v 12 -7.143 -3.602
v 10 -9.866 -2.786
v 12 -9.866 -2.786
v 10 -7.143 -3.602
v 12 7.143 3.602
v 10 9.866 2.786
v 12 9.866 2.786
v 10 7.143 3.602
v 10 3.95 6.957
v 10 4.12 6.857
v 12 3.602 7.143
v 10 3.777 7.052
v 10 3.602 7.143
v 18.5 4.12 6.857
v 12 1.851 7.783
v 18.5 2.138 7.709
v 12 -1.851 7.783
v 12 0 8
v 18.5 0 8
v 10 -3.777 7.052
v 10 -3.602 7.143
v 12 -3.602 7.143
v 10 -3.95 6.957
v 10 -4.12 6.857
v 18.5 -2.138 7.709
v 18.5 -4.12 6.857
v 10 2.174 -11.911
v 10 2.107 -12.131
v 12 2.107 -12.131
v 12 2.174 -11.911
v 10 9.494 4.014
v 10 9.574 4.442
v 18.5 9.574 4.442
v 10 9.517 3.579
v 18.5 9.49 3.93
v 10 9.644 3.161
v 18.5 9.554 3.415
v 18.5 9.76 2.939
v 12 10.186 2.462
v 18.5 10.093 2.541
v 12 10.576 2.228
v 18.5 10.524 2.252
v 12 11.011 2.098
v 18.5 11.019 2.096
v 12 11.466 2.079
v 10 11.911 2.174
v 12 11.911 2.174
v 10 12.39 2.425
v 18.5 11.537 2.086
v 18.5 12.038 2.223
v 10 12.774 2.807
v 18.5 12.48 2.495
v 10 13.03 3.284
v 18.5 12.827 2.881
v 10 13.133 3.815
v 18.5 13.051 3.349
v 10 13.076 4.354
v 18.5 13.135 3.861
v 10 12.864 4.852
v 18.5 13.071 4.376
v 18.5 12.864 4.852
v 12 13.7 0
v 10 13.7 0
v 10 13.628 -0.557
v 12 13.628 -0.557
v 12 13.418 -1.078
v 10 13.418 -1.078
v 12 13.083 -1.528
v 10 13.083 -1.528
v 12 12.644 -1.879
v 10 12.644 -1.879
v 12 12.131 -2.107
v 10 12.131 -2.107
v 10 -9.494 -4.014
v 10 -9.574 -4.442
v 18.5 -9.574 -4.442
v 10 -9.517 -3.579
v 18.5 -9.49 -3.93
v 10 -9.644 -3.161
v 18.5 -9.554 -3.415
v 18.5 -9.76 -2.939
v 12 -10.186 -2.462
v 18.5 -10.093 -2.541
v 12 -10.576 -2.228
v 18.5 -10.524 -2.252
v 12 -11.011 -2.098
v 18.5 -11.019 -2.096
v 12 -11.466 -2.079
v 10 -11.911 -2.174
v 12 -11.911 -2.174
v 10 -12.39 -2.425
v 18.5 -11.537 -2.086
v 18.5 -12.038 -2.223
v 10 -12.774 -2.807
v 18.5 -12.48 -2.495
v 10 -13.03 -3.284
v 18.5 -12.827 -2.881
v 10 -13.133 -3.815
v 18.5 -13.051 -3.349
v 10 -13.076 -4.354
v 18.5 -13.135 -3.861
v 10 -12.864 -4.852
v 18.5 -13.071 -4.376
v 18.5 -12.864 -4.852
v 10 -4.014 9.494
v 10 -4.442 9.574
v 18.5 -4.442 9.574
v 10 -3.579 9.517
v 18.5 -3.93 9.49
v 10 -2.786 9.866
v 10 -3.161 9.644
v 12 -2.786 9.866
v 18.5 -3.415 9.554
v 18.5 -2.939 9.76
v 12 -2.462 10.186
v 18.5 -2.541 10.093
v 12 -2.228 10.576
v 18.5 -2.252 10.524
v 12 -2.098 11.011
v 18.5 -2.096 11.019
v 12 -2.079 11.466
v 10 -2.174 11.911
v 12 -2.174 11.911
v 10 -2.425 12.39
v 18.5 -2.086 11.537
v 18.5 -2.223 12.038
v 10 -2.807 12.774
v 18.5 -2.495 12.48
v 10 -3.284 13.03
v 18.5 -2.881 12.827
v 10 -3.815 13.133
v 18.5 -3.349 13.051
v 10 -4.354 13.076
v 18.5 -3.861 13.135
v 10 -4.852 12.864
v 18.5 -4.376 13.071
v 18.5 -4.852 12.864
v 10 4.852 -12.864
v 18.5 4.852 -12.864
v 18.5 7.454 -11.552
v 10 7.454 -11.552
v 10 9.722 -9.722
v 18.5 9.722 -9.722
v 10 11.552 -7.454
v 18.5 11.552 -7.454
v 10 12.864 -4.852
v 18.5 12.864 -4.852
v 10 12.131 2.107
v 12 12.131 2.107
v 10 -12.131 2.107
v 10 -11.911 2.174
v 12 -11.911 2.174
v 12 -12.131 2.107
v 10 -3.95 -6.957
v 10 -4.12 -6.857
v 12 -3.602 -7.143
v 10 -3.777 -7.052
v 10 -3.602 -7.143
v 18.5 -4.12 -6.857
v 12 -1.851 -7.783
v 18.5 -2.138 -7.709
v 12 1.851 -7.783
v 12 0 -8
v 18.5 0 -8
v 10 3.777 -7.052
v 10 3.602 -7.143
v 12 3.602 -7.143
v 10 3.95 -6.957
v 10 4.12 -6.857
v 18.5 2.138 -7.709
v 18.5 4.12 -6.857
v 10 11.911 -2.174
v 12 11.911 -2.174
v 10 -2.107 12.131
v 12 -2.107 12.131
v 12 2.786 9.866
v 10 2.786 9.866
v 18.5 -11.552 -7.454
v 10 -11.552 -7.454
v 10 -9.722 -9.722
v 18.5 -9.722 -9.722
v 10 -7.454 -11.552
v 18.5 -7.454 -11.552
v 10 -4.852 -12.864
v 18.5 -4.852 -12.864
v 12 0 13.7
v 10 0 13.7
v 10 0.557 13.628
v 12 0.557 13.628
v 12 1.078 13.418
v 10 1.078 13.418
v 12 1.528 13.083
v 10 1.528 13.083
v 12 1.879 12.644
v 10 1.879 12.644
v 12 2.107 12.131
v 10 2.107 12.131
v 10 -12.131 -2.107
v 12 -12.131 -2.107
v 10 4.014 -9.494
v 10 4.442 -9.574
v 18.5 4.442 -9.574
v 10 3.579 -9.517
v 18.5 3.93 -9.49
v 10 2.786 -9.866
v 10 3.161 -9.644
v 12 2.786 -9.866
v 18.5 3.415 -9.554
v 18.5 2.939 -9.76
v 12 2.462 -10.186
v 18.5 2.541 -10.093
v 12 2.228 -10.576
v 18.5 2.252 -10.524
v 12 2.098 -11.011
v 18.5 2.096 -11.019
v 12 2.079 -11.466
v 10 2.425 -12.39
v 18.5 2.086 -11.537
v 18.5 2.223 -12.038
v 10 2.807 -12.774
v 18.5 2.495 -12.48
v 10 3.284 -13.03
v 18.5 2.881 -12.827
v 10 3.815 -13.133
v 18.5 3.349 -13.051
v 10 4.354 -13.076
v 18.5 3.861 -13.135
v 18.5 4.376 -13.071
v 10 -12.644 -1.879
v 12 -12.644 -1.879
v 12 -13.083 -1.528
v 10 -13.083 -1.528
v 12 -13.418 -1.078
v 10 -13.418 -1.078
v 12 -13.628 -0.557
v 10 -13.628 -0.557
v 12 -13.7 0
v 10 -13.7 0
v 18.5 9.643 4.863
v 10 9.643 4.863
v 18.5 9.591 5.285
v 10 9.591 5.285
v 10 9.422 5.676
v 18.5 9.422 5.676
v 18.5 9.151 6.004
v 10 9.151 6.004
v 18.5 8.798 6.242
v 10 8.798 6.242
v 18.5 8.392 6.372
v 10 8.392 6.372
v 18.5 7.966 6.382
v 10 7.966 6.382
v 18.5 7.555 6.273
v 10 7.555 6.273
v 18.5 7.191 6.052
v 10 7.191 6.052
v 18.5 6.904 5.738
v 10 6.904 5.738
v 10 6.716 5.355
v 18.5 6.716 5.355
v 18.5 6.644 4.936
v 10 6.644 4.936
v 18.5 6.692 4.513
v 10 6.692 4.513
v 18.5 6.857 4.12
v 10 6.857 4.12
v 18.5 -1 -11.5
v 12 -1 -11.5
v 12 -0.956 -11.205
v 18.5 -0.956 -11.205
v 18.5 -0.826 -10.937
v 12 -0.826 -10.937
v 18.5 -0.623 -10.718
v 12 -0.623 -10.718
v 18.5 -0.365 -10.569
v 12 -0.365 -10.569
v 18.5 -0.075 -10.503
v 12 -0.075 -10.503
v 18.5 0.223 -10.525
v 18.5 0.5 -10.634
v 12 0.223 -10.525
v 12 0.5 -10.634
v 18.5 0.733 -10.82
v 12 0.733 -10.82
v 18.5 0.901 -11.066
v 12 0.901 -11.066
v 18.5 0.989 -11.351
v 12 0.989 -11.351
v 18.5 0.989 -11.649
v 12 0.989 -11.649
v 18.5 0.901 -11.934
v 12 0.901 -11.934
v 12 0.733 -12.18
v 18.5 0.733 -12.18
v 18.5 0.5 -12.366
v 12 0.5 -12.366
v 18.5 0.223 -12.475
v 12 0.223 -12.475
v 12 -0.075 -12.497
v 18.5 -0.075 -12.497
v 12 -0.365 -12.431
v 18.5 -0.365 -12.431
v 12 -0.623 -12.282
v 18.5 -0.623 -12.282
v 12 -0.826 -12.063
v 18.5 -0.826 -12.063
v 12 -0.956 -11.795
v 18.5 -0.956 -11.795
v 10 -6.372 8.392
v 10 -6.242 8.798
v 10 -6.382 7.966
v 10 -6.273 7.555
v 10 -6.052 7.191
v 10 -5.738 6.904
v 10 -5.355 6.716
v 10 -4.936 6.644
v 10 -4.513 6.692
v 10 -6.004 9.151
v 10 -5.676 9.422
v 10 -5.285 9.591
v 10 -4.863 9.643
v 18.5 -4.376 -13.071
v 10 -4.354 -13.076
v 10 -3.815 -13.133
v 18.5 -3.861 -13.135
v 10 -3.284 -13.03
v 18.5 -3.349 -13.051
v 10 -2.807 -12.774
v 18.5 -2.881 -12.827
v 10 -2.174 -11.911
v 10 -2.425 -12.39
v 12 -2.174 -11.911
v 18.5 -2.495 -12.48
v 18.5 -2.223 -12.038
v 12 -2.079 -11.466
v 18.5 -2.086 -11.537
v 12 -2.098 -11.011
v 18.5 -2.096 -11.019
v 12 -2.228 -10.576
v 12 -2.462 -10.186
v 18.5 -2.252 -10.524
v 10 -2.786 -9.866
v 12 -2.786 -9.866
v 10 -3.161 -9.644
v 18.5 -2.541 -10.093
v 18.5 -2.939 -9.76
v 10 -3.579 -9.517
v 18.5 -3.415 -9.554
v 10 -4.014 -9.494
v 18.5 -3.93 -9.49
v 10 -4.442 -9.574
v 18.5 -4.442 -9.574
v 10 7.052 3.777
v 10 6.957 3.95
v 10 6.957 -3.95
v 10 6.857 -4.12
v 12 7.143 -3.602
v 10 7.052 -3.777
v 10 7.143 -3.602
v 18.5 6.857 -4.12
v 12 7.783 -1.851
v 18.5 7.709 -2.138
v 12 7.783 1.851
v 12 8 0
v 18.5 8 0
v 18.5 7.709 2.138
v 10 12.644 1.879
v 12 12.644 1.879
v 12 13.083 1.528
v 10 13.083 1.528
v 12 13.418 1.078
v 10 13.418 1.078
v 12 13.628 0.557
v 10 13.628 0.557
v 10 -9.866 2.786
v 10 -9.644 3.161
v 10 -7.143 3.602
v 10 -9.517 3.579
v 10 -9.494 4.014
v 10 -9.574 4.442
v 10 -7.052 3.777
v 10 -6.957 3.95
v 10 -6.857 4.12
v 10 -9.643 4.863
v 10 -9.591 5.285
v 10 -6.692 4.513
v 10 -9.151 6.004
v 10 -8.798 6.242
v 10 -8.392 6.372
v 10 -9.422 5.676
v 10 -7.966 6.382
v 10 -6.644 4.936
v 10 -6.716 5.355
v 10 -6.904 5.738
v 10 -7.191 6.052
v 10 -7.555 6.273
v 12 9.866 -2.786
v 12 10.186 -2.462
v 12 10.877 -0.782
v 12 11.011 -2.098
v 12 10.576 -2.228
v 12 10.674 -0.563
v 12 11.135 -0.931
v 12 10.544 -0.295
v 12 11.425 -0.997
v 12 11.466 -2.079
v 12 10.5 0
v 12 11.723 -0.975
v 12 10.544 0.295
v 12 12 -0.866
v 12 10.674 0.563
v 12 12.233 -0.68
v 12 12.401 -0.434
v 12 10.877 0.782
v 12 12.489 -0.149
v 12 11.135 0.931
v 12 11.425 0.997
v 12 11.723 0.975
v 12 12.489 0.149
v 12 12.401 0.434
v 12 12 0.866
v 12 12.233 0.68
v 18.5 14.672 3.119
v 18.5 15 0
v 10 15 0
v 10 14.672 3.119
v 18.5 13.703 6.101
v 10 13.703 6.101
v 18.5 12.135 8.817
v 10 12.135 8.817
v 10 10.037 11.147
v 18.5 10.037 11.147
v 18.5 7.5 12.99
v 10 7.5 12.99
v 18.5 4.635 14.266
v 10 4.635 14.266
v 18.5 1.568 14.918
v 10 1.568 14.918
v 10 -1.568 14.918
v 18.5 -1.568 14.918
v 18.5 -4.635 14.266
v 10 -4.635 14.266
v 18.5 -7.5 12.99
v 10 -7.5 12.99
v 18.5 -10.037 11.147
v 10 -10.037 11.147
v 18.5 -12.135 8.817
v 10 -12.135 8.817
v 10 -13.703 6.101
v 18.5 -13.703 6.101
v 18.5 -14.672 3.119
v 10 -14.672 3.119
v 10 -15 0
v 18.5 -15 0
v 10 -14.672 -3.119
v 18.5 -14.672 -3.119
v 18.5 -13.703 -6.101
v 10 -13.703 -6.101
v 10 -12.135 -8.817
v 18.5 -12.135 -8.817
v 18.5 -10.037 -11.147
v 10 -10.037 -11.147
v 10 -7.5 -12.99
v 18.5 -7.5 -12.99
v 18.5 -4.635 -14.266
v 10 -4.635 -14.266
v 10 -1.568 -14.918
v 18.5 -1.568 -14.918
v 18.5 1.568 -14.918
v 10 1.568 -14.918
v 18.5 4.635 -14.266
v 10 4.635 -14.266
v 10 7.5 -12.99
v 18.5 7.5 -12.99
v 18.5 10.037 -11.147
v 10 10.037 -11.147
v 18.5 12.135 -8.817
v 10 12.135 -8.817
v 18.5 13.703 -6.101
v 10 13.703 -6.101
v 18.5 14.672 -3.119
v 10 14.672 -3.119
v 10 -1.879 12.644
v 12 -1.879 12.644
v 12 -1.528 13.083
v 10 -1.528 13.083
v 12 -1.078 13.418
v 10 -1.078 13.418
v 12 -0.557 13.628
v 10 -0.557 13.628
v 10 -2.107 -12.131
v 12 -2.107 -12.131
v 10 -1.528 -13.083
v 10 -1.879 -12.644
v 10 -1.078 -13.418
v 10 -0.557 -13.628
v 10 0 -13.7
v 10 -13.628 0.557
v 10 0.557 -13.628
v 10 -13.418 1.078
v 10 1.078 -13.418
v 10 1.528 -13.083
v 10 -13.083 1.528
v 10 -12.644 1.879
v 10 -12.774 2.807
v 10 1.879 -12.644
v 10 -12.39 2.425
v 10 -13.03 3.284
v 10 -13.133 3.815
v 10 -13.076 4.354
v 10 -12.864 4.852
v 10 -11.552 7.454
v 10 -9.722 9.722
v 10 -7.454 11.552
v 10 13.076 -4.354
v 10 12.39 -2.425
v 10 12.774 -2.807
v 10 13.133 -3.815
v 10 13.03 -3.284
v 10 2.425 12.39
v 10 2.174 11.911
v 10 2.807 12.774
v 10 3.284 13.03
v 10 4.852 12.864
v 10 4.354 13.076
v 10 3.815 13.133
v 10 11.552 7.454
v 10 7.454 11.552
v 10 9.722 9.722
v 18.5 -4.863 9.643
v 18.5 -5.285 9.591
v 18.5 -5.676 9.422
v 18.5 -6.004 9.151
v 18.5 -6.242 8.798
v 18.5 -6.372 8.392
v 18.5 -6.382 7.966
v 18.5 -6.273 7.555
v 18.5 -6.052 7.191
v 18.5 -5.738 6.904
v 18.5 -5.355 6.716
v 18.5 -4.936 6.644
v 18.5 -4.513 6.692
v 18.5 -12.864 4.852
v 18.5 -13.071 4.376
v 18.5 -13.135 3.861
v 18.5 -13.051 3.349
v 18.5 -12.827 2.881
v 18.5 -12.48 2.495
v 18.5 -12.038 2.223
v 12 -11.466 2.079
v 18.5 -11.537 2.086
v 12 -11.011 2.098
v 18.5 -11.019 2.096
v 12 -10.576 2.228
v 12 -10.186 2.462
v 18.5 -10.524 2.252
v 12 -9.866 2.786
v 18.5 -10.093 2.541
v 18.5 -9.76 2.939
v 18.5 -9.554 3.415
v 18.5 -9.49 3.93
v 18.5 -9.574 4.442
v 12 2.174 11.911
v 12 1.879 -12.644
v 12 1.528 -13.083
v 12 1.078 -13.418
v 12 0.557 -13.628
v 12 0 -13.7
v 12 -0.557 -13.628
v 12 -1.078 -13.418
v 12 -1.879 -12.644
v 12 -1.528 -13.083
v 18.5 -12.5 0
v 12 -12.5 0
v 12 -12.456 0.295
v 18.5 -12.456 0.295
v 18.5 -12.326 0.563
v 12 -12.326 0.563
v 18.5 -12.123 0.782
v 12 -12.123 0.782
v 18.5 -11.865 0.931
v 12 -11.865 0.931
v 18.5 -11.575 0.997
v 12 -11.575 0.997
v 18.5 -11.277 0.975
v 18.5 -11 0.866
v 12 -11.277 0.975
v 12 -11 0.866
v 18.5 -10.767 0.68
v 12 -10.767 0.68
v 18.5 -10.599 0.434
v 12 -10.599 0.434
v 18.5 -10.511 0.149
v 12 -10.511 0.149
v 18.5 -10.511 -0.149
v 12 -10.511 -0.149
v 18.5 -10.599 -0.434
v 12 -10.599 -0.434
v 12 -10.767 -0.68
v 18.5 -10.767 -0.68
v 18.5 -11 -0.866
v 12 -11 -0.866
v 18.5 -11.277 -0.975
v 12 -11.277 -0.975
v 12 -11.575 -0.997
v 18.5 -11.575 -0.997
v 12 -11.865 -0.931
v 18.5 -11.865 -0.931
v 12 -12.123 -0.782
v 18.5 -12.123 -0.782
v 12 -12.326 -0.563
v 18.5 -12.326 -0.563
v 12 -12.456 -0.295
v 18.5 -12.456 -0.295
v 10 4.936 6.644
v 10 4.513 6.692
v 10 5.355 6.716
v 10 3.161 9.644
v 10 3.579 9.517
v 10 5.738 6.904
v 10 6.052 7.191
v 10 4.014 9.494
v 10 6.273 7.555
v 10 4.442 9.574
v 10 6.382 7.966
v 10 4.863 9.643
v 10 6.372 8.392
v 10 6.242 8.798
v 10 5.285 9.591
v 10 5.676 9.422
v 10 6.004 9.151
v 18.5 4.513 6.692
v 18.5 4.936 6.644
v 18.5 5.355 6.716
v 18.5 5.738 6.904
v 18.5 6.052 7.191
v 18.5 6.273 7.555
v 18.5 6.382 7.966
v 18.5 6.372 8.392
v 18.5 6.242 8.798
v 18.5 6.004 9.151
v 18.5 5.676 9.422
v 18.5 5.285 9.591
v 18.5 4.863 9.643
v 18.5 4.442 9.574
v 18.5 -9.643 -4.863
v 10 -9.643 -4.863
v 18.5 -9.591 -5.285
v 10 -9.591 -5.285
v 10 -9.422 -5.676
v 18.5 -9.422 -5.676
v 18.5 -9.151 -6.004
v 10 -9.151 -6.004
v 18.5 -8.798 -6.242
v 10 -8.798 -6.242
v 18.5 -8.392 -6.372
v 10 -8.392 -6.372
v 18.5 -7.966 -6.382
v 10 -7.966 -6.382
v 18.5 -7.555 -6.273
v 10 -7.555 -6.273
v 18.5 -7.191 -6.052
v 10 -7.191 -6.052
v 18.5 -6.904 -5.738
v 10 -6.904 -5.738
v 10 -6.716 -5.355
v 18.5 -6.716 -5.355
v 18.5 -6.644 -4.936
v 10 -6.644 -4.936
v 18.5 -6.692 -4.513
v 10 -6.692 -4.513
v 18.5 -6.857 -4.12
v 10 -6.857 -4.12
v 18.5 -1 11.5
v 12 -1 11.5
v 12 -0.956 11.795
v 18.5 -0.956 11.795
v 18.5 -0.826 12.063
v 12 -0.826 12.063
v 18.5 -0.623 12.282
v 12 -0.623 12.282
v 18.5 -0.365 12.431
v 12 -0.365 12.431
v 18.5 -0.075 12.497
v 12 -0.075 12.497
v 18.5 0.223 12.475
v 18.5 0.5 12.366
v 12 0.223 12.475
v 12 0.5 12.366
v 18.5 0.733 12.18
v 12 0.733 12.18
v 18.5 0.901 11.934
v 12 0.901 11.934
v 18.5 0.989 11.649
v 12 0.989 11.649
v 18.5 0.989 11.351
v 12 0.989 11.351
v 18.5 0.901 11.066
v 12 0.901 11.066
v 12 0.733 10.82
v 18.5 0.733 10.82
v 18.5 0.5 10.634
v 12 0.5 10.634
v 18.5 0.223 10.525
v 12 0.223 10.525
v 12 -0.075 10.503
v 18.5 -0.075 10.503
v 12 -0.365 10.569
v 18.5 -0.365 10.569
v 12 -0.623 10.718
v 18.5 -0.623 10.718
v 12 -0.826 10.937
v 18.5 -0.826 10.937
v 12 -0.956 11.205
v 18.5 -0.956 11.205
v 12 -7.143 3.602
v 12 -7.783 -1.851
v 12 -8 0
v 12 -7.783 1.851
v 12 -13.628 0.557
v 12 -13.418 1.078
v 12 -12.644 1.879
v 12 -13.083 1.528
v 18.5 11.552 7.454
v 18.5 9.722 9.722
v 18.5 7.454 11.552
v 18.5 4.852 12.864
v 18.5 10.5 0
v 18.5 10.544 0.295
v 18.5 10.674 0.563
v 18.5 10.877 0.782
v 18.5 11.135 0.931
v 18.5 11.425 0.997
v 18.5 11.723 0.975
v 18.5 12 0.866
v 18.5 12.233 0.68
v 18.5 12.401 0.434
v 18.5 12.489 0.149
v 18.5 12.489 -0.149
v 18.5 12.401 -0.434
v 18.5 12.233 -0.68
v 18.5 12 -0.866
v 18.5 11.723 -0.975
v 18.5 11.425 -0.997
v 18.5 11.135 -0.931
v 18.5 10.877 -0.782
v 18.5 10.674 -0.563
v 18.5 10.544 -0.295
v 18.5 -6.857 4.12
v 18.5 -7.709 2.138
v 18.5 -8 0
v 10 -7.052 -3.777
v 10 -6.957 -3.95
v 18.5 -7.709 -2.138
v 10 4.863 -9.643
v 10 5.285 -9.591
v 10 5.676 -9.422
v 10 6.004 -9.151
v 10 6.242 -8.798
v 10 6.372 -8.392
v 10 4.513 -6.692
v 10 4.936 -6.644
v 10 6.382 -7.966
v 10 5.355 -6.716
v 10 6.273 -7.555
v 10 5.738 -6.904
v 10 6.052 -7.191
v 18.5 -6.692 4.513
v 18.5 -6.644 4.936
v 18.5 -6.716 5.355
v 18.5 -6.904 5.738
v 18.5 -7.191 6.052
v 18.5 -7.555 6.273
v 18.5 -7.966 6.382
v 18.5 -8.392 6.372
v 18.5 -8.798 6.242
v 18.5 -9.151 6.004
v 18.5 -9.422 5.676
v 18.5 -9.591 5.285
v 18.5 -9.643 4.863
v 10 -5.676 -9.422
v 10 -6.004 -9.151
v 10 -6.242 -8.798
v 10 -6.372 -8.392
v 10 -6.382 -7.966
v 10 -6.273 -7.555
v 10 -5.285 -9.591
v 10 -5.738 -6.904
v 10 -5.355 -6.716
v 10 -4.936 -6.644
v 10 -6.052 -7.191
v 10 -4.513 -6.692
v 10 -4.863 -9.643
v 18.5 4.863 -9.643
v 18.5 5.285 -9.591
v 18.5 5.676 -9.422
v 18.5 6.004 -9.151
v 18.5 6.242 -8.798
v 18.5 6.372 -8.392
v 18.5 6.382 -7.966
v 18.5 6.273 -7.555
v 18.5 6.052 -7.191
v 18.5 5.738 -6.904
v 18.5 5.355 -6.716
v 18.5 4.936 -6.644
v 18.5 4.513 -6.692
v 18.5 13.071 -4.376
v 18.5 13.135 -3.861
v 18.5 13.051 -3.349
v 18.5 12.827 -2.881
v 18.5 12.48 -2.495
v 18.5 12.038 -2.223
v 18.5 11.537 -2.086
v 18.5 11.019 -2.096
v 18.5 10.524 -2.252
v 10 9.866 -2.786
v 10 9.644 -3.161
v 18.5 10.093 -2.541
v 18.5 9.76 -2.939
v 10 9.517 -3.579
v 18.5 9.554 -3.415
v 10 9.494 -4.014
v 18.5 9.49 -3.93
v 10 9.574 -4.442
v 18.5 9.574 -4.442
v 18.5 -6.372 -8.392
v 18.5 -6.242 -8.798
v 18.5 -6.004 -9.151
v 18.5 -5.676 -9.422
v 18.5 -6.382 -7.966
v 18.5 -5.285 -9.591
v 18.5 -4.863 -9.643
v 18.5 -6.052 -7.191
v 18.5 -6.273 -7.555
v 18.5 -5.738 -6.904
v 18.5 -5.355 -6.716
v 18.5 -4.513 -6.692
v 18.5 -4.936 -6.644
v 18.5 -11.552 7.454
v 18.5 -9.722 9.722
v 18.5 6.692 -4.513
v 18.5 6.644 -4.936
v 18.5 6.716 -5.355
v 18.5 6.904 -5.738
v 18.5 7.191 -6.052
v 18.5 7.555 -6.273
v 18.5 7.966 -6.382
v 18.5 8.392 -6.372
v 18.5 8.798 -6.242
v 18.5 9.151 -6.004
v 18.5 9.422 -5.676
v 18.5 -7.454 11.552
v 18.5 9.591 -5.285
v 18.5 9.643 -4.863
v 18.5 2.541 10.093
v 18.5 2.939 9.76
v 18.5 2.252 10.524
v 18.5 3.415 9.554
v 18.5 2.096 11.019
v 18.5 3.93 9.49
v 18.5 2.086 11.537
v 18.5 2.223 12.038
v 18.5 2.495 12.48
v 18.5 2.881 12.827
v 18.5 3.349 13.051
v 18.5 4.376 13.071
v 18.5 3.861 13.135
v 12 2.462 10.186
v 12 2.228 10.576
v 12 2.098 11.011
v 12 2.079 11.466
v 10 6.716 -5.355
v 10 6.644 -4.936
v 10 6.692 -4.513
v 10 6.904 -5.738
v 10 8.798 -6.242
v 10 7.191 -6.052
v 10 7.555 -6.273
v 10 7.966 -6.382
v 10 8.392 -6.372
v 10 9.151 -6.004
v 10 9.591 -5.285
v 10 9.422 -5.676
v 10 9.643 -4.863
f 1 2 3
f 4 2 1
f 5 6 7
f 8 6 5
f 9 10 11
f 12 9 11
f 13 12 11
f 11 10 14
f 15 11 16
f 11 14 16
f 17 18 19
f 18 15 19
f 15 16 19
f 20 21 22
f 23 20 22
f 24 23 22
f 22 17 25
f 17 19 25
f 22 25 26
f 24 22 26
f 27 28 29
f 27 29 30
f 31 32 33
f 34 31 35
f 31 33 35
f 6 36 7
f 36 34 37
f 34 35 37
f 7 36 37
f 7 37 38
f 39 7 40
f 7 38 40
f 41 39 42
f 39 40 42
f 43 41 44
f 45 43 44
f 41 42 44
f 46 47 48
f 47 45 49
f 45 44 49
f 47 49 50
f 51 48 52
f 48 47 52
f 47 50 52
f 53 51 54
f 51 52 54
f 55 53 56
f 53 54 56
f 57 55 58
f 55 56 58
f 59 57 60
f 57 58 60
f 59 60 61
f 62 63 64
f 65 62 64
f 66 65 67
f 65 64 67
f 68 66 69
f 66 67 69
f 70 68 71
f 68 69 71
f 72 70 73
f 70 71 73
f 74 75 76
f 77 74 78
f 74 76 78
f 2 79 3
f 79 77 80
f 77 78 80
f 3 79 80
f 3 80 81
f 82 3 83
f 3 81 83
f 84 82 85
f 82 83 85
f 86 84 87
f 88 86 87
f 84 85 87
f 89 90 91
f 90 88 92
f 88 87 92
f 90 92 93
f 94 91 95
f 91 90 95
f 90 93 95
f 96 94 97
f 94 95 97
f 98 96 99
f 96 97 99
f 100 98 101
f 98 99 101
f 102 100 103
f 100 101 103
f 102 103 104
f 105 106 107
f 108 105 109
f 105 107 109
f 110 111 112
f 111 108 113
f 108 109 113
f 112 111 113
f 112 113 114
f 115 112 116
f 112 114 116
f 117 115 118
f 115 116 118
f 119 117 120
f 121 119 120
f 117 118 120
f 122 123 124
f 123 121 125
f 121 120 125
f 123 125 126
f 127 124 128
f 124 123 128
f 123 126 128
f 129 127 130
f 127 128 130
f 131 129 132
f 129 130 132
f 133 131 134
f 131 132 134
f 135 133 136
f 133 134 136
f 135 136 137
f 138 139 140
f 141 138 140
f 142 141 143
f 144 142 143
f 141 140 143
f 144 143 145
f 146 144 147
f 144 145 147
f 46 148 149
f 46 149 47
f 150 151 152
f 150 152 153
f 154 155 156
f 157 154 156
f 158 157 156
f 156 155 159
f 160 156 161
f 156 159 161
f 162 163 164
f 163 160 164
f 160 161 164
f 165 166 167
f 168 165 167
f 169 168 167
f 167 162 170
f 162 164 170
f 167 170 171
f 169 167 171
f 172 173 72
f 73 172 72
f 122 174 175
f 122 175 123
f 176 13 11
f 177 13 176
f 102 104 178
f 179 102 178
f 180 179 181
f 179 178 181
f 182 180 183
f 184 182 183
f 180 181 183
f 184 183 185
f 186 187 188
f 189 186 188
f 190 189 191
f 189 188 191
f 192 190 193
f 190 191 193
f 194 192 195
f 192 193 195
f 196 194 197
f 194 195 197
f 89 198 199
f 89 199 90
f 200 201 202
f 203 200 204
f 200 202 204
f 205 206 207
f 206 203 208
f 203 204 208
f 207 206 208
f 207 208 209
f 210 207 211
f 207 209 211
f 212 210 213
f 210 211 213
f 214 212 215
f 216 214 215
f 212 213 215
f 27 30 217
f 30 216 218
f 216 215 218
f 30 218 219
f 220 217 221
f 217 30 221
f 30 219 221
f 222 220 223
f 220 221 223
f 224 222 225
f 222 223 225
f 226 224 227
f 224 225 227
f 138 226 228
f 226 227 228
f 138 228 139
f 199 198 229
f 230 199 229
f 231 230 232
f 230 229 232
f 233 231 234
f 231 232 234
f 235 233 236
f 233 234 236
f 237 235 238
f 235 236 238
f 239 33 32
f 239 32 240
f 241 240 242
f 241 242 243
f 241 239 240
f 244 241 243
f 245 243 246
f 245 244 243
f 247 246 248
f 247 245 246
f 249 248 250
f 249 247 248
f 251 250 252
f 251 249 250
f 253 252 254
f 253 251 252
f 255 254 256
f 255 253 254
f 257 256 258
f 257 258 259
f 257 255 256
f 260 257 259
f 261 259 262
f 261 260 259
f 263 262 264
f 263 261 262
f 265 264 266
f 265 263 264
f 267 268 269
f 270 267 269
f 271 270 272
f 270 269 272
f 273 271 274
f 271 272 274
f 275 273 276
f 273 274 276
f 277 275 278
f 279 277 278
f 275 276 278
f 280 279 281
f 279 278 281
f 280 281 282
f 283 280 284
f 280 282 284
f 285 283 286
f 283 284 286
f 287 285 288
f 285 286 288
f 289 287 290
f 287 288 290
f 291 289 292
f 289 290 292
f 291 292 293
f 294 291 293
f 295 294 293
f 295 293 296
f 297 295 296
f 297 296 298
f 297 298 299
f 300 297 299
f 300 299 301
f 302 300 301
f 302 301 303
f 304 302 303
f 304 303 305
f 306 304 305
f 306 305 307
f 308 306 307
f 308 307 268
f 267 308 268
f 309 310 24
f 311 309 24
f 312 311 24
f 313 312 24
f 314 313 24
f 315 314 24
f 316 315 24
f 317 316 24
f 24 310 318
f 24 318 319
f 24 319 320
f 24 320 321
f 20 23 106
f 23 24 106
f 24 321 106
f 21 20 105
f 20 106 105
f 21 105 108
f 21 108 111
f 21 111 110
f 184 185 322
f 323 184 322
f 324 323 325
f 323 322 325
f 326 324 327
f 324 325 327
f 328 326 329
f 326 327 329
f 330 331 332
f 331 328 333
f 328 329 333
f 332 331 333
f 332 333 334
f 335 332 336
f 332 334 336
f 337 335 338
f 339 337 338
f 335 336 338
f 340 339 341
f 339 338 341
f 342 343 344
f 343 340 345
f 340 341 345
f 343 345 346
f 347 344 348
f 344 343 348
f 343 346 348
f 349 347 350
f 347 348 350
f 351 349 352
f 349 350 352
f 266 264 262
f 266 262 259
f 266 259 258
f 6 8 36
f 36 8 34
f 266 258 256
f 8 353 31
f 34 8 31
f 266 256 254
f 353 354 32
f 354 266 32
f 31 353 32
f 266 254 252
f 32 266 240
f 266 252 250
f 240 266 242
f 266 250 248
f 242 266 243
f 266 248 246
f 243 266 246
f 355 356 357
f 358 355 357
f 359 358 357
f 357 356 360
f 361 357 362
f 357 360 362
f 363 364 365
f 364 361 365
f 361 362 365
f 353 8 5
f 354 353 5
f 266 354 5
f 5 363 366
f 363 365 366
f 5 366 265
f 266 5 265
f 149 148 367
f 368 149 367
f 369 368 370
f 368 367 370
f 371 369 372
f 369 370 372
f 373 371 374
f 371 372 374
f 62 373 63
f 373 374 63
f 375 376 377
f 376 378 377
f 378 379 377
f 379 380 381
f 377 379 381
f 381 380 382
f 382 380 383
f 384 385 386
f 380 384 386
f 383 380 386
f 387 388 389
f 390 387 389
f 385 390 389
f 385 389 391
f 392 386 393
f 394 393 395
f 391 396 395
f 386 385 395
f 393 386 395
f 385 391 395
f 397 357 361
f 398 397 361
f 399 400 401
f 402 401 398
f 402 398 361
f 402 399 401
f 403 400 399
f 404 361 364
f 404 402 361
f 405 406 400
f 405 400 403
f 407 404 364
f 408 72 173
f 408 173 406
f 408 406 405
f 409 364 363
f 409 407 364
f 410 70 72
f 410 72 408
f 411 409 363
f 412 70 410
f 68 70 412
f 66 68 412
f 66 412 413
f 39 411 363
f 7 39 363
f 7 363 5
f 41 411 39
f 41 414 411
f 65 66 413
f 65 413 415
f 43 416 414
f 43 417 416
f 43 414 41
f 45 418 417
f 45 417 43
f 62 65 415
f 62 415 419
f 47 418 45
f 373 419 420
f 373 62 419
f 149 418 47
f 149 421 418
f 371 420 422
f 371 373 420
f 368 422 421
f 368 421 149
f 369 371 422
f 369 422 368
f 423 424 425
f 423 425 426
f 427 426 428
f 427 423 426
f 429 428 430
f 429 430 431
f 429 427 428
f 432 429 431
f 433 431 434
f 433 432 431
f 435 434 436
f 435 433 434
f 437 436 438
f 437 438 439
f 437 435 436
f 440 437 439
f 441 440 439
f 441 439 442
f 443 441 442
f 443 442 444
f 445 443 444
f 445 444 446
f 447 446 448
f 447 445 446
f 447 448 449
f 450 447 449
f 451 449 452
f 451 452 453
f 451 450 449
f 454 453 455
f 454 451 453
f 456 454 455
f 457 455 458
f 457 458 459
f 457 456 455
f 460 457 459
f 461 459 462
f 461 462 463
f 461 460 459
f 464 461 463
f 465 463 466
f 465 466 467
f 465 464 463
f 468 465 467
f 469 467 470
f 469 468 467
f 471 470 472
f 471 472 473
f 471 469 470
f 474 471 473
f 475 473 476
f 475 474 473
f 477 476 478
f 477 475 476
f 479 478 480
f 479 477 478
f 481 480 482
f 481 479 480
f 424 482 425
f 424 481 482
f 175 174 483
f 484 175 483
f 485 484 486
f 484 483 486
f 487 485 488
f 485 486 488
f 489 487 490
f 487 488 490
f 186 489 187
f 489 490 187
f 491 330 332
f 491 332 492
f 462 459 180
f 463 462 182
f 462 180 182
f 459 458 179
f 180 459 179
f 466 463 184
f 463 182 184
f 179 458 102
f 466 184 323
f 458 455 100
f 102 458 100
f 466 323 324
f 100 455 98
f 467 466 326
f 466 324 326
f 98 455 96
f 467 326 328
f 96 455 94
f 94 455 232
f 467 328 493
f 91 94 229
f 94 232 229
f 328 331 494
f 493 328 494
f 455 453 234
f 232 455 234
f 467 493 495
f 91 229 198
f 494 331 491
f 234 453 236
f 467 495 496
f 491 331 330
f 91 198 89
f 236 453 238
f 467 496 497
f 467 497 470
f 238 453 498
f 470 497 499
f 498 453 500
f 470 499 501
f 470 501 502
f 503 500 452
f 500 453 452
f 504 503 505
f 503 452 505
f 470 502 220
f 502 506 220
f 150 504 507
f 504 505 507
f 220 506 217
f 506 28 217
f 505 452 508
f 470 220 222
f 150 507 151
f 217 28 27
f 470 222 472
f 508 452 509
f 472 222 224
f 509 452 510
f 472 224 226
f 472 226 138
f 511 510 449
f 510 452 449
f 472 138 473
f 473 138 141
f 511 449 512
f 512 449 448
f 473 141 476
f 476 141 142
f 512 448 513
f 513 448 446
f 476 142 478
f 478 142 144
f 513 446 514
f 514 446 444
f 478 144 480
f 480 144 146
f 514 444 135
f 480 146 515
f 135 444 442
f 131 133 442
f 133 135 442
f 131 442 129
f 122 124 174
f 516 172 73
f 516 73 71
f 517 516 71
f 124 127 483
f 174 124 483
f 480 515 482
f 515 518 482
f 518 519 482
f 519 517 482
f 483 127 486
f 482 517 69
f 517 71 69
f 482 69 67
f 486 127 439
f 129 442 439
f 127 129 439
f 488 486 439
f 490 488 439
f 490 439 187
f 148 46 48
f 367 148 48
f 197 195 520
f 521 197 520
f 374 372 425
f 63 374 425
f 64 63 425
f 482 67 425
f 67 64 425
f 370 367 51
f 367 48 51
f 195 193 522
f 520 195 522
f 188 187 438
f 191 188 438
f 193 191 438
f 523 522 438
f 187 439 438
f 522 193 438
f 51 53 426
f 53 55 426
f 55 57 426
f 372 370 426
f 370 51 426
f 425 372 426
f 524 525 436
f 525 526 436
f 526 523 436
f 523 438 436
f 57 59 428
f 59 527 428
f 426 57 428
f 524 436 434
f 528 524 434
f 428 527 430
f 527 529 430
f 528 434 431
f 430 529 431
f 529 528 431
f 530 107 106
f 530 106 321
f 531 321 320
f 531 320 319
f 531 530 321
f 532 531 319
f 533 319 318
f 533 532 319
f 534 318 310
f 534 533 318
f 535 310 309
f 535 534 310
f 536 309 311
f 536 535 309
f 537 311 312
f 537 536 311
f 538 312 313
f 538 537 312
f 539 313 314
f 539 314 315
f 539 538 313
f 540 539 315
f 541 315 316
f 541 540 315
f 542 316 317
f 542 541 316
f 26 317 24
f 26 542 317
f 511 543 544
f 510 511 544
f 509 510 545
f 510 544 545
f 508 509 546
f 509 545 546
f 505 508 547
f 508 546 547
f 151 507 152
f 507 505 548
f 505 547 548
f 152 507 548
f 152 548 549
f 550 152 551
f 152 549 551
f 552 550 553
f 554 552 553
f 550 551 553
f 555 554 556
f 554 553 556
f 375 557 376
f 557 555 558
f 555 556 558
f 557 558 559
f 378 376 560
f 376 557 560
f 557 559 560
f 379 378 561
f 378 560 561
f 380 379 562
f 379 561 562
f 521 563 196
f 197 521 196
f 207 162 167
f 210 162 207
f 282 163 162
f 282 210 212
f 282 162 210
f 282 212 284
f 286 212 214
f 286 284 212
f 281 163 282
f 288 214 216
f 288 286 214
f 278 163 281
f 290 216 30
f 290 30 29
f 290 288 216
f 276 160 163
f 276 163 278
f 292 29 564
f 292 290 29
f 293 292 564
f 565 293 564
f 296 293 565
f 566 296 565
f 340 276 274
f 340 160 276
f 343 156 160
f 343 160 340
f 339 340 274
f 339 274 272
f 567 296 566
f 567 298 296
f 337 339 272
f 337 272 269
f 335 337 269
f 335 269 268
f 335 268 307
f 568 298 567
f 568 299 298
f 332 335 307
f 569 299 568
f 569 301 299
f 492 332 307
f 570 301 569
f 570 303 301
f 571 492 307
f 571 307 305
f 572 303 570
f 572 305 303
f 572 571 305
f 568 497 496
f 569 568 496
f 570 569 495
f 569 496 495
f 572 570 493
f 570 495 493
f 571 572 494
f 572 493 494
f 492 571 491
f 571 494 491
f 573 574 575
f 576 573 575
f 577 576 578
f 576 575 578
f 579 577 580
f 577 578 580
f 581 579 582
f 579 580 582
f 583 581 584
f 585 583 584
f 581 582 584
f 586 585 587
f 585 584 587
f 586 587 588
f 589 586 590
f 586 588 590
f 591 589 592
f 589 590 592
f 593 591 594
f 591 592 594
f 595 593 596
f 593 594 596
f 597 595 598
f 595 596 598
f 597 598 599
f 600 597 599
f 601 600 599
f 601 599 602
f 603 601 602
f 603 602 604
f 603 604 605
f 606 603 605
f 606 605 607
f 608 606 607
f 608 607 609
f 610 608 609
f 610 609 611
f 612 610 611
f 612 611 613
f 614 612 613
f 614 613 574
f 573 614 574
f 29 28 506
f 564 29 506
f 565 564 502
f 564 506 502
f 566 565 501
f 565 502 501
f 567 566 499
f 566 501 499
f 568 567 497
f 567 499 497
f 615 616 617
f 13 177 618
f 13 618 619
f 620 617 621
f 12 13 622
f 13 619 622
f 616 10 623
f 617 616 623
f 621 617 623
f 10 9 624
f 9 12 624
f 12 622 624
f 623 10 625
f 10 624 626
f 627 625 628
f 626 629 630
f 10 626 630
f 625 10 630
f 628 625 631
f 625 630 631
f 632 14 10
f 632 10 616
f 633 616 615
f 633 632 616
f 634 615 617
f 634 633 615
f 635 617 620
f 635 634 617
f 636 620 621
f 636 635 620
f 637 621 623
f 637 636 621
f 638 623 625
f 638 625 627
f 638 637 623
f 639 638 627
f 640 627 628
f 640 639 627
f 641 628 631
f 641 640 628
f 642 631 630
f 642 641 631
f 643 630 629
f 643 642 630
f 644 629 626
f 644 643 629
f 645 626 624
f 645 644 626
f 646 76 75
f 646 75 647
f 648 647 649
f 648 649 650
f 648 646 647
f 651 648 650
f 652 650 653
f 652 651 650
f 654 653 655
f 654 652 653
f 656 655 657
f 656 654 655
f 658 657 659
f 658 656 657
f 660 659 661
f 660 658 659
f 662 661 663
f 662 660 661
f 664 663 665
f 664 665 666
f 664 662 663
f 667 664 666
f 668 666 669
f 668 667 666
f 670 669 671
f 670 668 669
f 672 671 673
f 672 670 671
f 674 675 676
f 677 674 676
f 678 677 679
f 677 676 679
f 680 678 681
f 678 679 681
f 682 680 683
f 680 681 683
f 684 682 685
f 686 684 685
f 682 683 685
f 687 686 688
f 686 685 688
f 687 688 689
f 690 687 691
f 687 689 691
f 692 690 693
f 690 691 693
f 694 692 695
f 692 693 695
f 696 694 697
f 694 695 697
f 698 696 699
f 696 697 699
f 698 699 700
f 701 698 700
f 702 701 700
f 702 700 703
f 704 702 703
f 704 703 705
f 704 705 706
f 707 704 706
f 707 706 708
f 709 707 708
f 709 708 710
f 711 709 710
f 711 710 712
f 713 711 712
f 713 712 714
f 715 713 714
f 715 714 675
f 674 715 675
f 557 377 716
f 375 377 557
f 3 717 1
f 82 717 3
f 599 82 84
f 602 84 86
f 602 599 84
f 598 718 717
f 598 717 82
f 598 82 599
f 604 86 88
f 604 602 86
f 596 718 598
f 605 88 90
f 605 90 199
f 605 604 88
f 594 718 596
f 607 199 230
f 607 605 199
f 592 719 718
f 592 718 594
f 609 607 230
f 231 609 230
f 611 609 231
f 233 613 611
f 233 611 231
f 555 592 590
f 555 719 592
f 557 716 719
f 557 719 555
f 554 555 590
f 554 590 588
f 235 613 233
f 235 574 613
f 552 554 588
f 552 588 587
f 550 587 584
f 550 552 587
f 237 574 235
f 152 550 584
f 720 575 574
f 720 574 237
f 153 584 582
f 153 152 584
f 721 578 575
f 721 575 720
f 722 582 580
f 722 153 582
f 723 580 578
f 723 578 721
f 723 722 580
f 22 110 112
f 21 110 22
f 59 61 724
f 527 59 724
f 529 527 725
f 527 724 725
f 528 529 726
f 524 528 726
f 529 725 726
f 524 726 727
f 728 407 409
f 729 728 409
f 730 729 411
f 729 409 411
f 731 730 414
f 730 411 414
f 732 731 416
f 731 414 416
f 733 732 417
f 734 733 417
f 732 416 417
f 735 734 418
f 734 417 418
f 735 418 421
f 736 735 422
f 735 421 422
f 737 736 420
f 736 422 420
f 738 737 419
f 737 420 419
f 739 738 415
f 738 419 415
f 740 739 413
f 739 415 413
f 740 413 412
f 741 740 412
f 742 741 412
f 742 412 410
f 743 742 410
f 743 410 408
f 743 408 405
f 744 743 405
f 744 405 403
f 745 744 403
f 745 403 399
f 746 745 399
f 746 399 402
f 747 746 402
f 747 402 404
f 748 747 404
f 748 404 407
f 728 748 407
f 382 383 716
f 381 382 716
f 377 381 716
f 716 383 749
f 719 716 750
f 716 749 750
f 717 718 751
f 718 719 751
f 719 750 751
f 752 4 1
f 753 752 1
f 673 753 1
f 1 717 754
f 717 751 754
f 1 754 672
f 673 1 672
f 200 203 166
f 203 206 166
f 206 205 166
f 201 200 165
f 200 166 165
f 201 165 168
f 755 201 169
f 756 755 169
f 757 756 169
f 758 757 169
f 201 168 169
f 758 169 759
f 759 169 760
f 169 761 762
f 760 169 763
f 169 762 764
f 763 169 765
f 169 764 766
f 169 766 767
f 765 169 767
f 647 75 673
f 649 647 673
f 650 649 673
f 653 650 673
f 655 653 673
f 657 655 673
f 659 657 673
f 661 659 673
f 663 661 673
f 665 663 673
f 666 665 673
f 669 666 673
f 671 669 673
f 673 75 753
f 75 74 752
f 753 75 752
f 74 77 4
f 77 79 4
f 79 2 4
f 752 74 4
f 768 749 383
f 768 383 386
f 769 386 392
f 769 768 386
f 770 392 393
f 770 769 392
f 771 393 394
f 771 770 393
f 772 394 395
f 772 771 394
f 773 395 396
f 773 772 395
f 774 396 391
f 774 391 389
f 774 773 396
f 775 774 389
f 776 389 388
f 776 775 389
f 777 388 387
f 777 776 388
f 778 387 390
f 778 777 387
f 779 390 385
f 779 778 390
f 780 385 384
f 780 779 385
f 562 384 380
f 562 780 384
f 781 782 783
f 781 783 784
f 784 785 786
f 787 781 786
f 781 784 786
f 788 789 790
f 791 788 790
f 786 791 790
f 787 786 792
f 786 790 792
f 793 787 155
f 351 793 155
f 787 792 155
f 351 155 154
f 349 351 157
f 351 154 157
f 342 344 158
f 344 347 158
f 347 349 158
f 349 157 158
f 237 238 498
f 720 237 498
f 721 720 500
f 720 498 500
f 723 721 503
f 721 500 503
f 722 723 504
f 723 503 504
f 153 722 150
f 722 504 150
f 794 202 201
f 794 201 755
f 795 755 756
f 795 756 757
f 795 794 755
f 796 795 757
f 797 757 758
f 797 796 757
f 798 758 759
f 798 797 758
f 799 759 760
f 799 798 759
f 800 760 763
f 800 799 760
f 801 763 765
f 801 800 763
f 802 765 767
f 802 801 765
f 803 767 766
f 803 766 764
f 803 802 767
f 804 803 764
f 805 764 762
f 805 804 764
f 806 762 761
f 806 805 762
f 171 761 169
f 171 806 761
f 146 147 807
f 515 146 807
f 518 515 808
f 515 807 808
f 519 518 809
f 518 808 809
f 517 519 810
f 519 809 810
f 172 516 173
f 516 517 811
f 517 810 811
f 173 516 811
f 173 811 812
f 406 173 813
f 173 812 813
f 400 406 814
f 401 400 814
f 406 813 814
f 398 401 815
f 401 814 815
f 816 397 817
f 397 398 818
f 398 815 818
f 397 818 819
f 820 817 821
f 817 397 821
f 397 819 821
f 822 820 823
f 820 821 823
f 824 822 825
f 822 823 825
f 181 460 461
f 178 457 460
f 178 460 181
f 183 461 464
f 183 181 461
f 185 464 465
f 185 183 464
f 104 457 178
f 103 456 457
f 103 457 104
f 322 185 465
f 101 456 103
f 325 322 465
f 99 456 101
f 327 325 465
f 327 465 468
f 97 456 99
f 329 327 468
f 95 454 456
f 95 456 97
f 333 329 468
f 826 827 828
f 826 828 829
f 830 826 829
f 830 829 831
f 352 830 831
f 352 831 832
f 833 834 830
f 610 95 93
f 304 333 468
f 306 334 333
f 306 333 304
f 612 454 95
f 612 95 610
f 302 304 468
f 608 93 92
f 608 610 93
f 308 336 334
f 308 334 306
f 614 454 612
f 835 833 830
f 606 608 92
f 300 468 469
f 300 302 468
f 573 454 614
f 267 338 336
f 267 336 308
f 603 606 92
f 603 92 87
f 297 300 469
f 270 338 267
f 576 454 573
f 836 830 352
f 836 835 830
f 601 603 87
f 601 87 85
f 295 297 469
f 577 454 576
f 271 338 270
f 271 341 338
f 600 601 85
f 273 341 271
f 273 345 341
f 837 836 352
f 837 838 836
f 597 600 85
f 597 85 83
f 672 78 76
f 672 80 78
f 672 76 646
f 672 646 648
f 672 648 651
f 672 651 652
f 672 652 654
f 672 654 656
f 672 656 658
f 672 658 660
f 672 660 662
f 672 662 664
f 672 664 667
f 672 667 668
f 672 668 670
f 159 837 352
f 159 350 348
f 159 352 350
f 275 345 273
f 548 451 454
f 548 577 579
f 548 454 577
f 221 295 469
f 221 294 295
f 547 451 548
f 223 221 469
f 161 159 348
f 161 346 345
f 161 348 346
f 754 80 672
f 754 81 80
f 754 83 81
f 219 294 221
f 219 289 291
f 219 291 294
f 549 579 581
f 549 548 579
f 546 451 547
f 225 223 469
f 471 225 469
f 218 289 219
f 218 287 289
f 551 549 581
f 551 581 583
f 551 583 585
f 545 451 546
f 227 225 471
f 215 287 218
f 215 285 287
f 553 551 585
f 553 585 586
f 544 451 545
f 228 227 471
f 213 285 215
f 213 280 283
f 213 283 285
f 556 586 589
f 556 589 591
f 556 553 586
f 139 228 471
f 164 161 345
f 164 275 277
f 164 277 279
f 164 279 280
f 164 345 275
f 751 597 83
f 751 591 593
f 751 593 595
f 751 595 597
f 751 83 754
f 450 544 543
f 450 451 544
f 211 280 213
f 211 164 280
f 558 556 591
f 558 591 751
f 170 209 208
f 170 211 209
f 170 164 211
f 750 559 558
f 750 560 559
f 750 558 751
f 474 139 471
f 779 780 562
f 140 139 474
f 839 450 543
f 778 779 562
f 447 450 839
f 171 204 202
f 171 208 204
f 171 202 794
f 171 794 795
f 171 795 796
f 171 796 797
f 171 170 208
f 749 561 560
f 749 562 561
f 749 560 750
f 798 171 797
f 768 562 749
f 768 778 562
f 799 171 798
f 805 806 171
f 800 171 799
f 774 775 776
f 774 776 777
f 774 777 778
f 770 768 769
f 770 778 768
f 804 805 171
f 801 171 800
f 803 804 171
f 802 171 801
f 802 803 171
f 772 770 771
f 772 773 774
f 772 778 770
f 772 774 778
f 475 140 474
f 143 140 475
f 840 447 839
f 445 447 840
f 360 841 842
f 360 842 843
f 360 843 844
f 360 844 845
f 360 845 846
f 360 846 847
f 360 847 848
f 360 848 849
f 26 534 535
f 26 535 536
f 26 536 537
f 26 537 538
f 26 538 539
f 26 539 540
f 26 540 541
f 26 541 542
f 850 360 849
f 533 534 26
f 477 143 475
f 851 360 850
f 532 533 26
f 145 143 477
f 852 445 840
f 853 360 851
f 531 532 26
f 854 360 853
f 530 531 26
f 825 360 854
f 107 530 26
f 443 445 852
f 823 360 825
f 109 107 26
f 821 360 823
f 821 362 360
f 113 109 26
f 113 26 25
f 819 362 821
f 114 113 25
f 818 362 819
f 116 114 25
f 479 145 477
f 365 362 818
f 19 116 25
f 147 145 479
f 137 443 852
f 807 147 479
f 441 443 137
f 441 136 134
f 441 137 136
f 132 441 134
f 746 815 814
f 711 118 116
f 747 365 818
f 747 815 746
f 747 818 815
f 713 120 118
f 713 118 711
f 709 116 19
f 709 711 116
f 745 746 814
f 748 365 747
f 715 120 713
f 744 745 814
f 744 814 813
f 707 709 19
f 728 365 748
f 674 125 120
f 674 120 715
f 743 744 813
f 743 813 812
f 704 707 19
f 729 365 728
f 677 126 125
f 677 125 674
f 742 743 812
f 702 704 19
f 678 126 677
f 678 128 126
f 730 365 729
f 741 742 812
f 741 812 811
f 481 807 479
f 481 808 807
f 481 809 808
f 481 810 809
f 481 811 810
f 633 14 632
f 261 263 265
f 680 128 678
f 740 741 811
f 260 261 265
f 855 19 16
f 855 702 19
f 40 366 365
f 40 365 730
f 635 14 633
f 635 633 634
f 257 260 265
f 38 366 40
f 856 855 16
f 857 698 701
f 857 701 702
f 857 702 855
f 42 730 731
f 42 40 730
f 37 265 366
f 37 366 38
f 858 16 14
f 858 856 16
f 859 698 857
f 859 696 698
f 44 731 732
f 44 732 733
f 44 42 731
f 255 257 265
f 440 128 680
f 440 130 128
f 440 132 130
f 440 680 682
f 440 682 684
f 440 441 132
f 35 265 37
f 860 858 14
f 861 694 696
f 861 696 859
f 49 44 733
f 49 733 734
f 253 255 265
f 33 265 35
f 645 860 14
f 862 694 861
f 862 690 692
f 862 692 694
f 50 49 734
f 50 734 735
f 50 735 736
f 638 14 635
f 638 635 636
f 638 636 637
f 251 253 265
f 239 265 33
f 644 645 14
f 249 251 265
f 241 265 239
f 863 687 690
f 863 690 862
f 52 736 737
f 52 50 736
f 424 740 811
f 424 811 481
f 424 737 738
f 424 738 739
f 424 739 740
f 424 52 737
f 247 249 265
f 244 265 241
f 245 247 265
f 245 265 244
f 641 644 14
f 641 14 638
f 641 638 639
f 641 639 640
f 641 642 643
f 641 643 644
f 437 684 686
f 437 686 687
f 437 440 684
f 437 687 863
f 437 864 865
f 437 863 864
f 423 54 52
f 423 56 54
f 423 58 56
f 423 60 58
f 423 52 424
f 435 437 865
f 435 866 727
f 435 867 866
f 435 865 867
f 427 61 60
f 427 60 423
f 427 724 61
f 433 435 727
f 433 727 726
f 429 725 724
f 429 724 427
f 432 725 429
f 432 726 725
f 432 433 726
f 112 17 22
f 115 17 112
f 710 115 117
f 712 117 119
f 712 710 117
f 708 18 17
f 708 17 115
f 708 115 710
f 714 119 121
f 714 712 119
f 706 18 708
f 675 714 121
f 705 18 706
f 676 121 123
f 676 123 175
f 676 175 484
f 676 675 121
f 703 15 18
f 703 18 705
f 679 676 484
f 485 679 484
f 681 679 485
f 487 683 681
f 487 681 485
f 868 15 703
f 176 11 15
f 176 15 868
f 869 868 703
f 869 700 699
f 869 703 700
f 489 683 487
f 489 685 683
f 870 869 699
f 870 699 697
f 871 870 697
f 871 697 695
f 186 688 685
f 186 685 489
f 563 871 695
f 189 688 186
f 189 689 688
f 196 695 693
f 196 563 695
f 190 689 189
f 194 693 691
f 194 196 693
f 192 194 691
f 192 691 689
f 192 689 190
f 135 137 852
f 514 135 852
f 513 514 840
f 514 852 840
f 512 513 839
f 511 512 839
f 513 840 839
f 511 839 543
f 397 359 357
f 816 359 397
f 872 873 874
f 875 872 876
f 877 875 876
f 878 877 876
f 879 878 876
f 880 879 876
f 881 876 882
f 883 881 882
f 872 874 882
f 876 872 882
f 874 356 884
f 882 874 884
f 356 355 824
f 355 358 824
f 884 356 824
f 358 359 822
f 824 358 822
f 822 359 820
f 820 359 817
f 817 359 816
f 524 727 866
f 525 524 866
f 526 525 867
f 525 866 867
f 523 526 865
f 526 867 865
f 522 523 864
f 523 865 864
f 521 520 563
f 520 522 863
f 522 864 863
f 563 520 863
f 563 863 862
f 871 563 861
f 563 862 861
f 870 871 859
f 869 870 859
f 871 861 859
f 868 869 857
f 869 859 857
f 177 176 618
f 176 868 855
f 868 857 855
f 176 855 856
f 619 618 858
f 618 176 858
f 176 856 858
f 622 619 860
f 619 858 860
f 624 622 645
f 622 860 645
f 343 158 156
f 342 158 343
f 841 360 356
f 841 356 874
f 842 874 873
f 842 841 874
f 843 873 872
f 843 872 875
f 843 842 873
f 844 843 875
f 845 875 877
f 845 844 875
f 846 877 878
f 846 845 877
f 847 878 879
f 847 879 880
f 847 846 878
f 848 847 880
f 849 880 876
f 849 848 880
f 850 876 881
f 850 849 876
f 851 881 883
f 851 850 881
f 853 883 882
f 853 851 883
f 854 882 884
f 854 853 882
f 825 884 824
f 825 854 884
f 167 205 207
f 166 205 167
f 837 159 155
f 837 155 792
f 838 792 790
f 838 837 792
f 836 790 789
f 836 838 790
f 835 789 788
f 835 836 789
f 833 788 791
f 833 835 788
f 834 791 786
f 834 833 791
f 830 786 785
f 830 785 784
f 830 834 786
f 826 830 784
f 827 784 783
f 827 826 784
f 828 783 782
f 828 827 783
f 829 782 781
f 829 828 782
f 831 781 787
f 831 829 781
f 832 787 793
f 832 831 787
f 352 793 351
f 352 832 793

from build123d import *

# Parameters (mm, degrees)
SKETCH103_R           = 15
SKETCH103_R_2         = 8
PAD055_DEPTH          = 8.5
POCKET033_DEPTH       = 95.040009
POLARPATTERN024_COUNT = 4
POCKET034_DEPTH       = 2
POLARPATTERN025_COUNT = 4
SKETCH108_R           = 1
POCKET035_DEPTH       = 8.501


with BuildPart() as part:
    # Sketch103 → Pad055 (new body)
    with BuildSketch(Plane.YZ):
        Circle(SKETCH103_R)
        Circle(SKETCH103_R_2, mode=Mode.SUBTRACT)
    extrude(amount=-PAD055_DEPTH)

    # Sketch107 (on Face3 of Pad055) → Pocket033 (cut, through all)
    with BuildSketch(Plane.YZ):
        with BuildLine():
            ThreePointArc((4.120305, 6.857338), (6.382423, 7.966433), (4.442476, 9.573877))
            ThreePointArc((4.851745, 12.86394), (2.086453, 11.537443), (4.442476, 9.573877))
            ThreePointArc((12.86394, 4.851745), (9.721636, 9.721636), (4.851745, 12.86394))
            ThreePointArc((9.573874, 4.442468), (11.537447, 2.086454), (12.86394, 4.851745))
            ThreePointArc((9.573874, 4.442468), (7.966437, 6.382423), (6.857338, 4.120305))
            ThreePointArc((6.857338, 4.120305), (5.656854, 5.656854), (4.120305, 6.857338))
        make_face()
    pocket033 = extrude(amount=-POCKET033_DEPTH, mode=Mode.SUBTRACT)

    # PolarPattern024: Pocket033 ×4 about axis
    polarpattern024_axis = Axis((0, 0, 0), (1, 0, 0))
    for i in range(1, POLARPATTERN024_COUNT):
        add(pocket033.rotate(polarpattern024_axis, i * 360 / POLARPATTERN024_COUNT), mode=Mode.SUBTRACT)

    # Sketch105 (on ShapeBinder) → Pocket034 (cut)
    with BuildSketch(Plane(origin=(-8.5, 0, 0), x_dir=(0, -1, 0), z_dir=(-1, 0, 0))):
        with BuildLine():
            ThreePointArc((2.107476, 12.131304), (1.313608, 13.264776), (0, 13.7))
            Line((0, 13.7), (0, 0))
            Line((0, 0), (13.7, 0))
            ThreePointArc((13.7, 0), (13.264776, 1.313608), (12.131304, 2.107476))
            Line((7.14341, 3.601623), (12.131304, 2.107476))
            ThreePointArc((7.14341, 3.601623), (5.656854, 5.656854), (3.601623, 7.14341))
            Line((2.107476, 12.131304), (3.601623, 7.14341))
        make_face()
    pocket034 = extrude(amount=-POCKET034_DEPTH, mode=Mode.SUBTRACT)

    # PolarPattern025: Pocket034 ×4 about axis
    polarpattern025_axis = Axis((-8.5, 0, 0), (-1, 0, 0))
    for i in range(1, POLARPATTERN025_COUNT):
        add(pocket034.rotate(polarpattern025_axis, i * 360 / POLARPATTERN025_COUNT), mode=Mode.SUBTRACT)

    # Sketch108 (on ShapeBinder) → Pocket035 (cut, through all)
    with BuildSketch(Plane(origin=(-8.5, 0, 0), x_dir=(0, -1, 0), z_dir=(-1, 0, 0))):
        with Locations((0, 11.5)):
            Circle(SKETCH108_R)
        with Locations((11.5, 0)):
            Circle(SKETCH108_R)
        with Locations((0, -11.5)):
            Circle(SKETCH108_R)
        with Locations((-11.5, 0)):
            Circle(SKETCH108_R)
    extrude(amount=-POCKET035_DEPTH, mode=Mode.SUBTRACT)


with BuildPart() as part_1:
    # Body038 placement: moved
    add(part.part.moved(Location((18.5, 0, 0))))


solid = part_1.part
